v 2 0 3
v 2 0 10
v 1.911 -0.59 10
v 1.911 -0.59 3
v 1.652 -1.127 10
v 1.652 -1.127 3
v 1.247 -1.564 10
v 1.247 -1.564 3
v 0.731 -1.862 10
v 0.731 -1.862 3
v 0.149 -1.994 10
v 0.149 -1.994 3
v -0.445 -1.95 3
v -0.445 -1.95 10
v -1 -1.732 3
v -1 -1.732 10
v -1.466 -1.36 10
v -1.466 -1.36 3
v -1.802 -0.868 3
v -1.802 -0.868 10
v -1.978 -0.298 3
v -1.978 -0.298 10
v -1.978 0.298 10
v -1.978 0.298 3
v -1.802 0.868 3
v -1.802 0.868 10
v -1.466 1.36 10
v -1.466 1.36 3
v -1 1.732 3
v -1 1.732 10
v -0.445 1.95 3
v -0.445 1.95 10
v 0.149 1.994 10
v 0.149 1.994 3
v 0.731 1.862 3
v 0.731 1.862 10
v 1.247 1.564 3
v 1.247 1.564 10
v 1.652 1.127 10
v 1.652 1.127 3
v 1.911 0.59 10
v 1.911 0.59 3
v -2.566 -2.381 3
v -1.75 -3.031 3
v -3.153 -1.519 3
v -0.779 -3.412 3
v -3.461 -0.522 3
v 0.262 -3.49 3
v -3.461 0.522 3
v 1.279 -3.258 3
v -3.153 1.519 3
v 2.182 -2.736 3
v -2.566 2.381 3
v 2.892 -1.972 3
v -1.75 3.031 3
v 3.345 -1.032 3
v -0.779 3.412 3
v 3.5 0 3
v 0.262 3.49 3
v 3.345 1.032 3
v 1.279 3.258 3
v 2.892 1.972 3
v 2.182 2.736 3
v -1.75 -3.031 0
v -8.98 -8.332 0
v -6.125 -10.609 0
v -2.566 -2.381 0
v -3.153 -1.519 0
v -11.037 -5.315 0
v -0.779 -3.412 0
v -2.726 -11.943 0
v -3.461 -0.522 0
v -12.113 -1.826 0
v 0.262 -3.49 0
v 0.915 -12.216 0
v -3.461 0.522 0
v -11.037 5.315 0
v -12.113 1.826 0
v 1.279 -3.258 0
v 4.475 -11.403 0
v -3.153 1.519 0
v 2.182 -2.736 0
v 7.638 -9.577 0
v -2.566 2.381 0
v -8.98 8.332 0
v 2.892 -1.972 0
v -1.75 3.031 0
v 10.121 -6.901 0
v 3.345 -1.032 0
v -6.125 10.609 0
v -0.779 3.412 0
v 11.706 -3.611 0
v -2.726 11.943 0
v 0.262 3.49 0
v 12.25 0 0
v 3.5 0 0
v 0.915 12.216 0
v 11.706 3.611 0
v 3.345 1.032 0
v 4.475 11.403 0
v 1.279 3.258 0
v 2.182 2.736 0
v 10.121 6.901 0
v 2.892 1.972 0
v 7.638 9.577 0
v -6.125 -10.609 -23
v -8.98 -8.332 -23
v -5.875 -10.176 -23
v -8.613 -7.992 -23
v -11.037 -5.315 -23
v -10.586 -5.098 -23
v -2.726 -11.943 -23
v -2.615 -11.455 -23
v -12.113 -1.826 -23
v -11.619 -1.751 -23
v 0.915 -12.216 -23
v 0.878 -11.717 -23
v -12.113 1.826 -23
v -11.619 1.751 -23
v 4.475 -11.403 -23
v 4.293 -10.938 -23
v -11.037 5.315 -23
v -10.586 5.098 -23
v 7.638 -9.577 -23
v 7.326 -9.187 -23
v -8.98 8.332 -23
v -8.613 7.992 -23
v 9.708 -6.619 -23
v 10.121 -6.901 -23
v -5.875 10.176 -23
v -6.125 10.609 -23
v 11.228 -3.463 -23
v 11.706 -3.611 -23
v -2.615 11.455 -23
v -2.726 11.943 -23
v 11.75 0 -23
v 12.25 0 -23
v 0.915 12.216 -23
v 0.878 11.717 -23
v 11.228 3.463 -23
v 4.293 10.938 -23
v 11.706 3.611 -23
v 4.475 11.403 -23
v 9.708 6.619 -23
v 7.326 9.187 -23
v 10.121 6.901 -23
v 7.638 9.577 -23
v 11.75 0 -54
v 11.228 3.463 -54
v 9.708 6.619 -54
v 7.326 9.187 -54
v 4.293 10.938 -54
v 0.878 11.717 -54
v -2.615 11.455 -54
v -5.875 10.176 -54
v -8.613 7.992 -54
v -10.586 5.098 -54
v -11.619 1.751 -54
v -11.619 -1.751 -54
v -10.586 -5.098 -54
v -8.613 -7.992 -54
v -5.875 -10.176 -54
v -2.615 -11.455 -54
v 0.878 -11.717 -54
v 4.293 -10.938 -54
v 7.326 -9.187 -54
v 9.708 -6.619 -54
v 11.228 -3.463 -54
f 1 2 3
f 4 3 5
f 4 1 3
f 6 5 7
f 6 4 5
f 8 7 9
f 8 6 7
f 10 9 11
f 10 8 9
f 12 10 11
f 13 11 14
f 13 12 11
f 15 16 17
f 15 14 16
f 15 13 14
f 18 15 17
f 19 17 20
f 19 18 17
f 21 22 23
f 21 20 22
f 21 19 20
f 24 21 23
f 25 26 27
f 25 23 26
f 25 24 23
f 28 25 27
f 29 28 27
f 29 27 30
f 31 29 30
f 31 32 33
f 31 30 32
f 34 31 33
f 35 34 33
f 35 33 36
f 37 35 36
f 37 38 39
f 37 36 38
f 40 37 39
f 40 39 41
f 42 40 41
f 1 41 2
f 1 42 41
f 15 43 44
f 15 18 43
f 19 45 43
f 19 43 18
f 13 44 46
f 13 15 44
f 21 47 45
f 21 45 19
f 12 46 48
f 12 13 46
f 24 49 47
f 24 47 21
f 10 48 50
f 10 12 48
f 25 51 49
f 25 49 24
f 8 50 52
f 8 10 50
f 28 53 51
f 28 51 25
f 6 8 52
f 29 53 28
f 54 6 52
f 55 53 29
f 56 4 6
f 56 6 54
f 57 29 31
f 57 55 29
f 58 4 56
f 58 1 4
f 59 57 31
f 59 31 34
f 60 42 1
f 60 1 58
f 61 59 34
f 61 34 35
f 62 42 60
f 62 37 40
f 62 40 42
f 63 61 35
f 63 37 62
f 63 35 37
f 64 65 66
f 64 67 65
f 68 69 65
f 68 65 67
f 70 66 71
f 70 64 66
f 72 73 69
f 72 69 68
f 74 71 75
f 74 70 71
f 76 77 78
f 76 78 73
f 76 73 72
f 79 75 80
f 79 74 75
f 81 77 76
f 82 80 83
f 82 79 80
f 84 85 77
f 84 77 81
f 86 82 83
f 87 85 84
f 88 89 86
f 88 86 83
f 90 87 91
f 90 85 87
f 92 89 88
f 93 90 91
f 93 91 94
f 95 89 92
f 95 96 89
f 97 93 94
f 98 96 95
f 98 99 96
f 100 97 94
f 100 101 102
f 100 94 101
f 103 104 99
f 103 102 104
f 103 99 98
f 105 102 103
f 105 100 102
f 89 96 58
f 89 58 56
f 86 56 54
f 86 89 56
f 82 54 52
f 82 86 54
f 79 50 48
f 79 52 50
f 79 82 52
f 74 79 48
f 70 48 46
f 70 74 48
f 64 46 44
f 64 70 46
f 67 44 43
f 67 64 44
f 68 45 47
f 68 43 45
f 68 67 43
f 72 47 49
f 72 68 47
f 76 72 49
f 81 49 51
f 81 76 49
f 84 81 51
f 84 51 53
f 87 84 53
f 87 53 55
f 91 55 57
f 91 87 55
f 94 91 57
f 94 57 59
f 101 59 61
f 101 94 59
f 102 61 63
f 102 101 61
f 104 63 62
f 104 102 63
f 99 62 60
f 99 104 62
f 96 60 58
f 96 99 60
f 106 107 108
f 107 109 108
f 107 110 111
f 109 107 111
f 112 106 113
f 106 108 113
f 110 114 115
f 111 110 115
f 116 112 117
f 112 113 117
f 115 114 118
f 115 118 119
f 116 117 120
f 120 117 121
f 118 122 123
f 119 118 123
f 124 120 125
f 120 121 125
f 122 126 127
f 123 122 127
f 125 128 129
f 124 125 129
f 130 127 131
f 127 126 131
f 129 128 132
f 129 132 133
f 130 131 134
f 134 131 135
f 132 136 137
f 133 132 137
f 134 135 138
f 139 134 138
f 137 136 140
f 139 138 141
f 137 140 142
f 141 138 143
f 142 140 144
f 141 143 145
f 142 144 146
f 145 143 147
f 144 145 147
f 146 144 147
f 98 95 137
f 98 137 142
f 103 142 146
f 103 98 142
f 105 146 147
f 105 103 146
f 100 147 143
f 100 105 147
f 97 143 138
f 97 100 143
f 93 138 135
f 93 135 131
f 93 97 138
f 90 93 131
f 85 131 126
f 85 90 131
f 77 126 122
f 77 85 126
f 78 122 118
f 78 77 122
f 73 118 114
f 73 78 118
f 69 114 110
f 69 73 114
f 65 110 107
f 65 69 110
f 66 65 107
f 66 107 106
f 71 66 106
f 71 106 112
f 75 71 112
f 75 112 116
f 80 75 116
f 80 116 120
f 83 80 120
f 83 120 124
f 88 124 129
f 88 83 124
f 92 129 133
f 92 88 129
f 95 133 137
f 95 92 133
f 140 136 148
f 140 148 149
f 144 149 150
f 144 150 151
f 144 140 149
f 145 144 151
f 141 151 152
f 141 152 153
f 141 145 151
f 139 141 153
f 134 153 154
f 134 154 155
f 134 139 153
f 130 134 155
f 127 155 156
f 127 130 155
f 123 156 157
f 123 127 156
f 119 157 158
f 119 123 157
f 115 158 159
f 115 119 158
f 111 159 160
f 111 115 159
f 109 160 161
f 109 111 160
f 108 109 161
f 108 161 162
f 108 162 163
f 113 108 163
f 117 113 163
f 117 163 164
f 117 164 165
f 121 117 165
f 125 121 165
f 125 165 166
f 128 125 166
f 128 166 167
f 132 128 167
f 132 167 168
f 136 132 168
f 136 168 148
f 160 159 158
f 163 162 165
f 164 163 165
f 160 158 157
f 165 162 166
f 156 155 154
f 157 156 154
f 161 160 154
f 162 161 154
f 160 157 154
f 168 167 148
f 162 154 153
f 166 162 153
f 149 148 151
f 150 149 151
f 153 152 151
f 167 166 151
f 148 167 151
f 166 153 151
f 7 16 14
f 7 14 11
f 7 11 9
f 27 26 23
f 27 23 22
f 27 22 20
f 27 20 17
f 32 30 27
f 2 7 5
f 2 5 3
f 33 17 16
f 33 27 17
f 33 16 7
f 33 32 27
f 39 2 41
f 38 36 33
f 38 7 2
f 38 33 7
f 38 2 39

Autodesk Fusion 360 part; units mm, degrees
sketch "Sketch1" plane through (0, 0, 0) normal (0, 0, 1) x (1, 0, 0) in component "Motor v2"
  circle A0 centre (0, 0) radius 12.25
  circle A1 centre (0, 0) radius 3.5
  circle A2 centre (0, 0) radius 2
  dimension "d1_2_1_1_1" = 24.5
  dimension "d8_1_1_1_1" = 7
  dimension "d9_1_1_1_1" = 4
  dimension "d478_1_1" = 0
  dimension "d479_1_1" = 0
  dimension "d480_1_1" = 0
  dimension "d481_1_1" = 0
ref_plane "WorkPlane1" through (0, 0, -23) normal (0, 0, 1) x (1, 0, 0) in component "Motor v2"
sketch "Sketch2" plane through (0, 0, -23) normal (0, 0, 1) x (1, 0, 0) in component "Motor v2"
  circle A0 centre (0, 0) radius 11.75
  dimension "d3_3_1_1" = 23.5
extrude "Extrude1" add sketch "Sketch1" against normal blind 23 contours A0 | A1 | A2 in component "Motor v2"
extrude "Extrude2" add sketch "Sketch2" against normal blind 31 in component "Motor v2"
extrude "Extrude3" add sketch "Sketch1" along normal blind 3 contours A1 | A2 in component "Motor v2"
extrude "Extrude4" add sketch "Sketch1" along normal blind 10 contours A2 in component "Motor v2"
component "Motor v2" placed x (1, 0, 0) y (0, 1, 0) z (0, 0, 1) at (0, 0, 0)
equation "d1_2_1_1_1 = 23.5 mm + 1 mm"
